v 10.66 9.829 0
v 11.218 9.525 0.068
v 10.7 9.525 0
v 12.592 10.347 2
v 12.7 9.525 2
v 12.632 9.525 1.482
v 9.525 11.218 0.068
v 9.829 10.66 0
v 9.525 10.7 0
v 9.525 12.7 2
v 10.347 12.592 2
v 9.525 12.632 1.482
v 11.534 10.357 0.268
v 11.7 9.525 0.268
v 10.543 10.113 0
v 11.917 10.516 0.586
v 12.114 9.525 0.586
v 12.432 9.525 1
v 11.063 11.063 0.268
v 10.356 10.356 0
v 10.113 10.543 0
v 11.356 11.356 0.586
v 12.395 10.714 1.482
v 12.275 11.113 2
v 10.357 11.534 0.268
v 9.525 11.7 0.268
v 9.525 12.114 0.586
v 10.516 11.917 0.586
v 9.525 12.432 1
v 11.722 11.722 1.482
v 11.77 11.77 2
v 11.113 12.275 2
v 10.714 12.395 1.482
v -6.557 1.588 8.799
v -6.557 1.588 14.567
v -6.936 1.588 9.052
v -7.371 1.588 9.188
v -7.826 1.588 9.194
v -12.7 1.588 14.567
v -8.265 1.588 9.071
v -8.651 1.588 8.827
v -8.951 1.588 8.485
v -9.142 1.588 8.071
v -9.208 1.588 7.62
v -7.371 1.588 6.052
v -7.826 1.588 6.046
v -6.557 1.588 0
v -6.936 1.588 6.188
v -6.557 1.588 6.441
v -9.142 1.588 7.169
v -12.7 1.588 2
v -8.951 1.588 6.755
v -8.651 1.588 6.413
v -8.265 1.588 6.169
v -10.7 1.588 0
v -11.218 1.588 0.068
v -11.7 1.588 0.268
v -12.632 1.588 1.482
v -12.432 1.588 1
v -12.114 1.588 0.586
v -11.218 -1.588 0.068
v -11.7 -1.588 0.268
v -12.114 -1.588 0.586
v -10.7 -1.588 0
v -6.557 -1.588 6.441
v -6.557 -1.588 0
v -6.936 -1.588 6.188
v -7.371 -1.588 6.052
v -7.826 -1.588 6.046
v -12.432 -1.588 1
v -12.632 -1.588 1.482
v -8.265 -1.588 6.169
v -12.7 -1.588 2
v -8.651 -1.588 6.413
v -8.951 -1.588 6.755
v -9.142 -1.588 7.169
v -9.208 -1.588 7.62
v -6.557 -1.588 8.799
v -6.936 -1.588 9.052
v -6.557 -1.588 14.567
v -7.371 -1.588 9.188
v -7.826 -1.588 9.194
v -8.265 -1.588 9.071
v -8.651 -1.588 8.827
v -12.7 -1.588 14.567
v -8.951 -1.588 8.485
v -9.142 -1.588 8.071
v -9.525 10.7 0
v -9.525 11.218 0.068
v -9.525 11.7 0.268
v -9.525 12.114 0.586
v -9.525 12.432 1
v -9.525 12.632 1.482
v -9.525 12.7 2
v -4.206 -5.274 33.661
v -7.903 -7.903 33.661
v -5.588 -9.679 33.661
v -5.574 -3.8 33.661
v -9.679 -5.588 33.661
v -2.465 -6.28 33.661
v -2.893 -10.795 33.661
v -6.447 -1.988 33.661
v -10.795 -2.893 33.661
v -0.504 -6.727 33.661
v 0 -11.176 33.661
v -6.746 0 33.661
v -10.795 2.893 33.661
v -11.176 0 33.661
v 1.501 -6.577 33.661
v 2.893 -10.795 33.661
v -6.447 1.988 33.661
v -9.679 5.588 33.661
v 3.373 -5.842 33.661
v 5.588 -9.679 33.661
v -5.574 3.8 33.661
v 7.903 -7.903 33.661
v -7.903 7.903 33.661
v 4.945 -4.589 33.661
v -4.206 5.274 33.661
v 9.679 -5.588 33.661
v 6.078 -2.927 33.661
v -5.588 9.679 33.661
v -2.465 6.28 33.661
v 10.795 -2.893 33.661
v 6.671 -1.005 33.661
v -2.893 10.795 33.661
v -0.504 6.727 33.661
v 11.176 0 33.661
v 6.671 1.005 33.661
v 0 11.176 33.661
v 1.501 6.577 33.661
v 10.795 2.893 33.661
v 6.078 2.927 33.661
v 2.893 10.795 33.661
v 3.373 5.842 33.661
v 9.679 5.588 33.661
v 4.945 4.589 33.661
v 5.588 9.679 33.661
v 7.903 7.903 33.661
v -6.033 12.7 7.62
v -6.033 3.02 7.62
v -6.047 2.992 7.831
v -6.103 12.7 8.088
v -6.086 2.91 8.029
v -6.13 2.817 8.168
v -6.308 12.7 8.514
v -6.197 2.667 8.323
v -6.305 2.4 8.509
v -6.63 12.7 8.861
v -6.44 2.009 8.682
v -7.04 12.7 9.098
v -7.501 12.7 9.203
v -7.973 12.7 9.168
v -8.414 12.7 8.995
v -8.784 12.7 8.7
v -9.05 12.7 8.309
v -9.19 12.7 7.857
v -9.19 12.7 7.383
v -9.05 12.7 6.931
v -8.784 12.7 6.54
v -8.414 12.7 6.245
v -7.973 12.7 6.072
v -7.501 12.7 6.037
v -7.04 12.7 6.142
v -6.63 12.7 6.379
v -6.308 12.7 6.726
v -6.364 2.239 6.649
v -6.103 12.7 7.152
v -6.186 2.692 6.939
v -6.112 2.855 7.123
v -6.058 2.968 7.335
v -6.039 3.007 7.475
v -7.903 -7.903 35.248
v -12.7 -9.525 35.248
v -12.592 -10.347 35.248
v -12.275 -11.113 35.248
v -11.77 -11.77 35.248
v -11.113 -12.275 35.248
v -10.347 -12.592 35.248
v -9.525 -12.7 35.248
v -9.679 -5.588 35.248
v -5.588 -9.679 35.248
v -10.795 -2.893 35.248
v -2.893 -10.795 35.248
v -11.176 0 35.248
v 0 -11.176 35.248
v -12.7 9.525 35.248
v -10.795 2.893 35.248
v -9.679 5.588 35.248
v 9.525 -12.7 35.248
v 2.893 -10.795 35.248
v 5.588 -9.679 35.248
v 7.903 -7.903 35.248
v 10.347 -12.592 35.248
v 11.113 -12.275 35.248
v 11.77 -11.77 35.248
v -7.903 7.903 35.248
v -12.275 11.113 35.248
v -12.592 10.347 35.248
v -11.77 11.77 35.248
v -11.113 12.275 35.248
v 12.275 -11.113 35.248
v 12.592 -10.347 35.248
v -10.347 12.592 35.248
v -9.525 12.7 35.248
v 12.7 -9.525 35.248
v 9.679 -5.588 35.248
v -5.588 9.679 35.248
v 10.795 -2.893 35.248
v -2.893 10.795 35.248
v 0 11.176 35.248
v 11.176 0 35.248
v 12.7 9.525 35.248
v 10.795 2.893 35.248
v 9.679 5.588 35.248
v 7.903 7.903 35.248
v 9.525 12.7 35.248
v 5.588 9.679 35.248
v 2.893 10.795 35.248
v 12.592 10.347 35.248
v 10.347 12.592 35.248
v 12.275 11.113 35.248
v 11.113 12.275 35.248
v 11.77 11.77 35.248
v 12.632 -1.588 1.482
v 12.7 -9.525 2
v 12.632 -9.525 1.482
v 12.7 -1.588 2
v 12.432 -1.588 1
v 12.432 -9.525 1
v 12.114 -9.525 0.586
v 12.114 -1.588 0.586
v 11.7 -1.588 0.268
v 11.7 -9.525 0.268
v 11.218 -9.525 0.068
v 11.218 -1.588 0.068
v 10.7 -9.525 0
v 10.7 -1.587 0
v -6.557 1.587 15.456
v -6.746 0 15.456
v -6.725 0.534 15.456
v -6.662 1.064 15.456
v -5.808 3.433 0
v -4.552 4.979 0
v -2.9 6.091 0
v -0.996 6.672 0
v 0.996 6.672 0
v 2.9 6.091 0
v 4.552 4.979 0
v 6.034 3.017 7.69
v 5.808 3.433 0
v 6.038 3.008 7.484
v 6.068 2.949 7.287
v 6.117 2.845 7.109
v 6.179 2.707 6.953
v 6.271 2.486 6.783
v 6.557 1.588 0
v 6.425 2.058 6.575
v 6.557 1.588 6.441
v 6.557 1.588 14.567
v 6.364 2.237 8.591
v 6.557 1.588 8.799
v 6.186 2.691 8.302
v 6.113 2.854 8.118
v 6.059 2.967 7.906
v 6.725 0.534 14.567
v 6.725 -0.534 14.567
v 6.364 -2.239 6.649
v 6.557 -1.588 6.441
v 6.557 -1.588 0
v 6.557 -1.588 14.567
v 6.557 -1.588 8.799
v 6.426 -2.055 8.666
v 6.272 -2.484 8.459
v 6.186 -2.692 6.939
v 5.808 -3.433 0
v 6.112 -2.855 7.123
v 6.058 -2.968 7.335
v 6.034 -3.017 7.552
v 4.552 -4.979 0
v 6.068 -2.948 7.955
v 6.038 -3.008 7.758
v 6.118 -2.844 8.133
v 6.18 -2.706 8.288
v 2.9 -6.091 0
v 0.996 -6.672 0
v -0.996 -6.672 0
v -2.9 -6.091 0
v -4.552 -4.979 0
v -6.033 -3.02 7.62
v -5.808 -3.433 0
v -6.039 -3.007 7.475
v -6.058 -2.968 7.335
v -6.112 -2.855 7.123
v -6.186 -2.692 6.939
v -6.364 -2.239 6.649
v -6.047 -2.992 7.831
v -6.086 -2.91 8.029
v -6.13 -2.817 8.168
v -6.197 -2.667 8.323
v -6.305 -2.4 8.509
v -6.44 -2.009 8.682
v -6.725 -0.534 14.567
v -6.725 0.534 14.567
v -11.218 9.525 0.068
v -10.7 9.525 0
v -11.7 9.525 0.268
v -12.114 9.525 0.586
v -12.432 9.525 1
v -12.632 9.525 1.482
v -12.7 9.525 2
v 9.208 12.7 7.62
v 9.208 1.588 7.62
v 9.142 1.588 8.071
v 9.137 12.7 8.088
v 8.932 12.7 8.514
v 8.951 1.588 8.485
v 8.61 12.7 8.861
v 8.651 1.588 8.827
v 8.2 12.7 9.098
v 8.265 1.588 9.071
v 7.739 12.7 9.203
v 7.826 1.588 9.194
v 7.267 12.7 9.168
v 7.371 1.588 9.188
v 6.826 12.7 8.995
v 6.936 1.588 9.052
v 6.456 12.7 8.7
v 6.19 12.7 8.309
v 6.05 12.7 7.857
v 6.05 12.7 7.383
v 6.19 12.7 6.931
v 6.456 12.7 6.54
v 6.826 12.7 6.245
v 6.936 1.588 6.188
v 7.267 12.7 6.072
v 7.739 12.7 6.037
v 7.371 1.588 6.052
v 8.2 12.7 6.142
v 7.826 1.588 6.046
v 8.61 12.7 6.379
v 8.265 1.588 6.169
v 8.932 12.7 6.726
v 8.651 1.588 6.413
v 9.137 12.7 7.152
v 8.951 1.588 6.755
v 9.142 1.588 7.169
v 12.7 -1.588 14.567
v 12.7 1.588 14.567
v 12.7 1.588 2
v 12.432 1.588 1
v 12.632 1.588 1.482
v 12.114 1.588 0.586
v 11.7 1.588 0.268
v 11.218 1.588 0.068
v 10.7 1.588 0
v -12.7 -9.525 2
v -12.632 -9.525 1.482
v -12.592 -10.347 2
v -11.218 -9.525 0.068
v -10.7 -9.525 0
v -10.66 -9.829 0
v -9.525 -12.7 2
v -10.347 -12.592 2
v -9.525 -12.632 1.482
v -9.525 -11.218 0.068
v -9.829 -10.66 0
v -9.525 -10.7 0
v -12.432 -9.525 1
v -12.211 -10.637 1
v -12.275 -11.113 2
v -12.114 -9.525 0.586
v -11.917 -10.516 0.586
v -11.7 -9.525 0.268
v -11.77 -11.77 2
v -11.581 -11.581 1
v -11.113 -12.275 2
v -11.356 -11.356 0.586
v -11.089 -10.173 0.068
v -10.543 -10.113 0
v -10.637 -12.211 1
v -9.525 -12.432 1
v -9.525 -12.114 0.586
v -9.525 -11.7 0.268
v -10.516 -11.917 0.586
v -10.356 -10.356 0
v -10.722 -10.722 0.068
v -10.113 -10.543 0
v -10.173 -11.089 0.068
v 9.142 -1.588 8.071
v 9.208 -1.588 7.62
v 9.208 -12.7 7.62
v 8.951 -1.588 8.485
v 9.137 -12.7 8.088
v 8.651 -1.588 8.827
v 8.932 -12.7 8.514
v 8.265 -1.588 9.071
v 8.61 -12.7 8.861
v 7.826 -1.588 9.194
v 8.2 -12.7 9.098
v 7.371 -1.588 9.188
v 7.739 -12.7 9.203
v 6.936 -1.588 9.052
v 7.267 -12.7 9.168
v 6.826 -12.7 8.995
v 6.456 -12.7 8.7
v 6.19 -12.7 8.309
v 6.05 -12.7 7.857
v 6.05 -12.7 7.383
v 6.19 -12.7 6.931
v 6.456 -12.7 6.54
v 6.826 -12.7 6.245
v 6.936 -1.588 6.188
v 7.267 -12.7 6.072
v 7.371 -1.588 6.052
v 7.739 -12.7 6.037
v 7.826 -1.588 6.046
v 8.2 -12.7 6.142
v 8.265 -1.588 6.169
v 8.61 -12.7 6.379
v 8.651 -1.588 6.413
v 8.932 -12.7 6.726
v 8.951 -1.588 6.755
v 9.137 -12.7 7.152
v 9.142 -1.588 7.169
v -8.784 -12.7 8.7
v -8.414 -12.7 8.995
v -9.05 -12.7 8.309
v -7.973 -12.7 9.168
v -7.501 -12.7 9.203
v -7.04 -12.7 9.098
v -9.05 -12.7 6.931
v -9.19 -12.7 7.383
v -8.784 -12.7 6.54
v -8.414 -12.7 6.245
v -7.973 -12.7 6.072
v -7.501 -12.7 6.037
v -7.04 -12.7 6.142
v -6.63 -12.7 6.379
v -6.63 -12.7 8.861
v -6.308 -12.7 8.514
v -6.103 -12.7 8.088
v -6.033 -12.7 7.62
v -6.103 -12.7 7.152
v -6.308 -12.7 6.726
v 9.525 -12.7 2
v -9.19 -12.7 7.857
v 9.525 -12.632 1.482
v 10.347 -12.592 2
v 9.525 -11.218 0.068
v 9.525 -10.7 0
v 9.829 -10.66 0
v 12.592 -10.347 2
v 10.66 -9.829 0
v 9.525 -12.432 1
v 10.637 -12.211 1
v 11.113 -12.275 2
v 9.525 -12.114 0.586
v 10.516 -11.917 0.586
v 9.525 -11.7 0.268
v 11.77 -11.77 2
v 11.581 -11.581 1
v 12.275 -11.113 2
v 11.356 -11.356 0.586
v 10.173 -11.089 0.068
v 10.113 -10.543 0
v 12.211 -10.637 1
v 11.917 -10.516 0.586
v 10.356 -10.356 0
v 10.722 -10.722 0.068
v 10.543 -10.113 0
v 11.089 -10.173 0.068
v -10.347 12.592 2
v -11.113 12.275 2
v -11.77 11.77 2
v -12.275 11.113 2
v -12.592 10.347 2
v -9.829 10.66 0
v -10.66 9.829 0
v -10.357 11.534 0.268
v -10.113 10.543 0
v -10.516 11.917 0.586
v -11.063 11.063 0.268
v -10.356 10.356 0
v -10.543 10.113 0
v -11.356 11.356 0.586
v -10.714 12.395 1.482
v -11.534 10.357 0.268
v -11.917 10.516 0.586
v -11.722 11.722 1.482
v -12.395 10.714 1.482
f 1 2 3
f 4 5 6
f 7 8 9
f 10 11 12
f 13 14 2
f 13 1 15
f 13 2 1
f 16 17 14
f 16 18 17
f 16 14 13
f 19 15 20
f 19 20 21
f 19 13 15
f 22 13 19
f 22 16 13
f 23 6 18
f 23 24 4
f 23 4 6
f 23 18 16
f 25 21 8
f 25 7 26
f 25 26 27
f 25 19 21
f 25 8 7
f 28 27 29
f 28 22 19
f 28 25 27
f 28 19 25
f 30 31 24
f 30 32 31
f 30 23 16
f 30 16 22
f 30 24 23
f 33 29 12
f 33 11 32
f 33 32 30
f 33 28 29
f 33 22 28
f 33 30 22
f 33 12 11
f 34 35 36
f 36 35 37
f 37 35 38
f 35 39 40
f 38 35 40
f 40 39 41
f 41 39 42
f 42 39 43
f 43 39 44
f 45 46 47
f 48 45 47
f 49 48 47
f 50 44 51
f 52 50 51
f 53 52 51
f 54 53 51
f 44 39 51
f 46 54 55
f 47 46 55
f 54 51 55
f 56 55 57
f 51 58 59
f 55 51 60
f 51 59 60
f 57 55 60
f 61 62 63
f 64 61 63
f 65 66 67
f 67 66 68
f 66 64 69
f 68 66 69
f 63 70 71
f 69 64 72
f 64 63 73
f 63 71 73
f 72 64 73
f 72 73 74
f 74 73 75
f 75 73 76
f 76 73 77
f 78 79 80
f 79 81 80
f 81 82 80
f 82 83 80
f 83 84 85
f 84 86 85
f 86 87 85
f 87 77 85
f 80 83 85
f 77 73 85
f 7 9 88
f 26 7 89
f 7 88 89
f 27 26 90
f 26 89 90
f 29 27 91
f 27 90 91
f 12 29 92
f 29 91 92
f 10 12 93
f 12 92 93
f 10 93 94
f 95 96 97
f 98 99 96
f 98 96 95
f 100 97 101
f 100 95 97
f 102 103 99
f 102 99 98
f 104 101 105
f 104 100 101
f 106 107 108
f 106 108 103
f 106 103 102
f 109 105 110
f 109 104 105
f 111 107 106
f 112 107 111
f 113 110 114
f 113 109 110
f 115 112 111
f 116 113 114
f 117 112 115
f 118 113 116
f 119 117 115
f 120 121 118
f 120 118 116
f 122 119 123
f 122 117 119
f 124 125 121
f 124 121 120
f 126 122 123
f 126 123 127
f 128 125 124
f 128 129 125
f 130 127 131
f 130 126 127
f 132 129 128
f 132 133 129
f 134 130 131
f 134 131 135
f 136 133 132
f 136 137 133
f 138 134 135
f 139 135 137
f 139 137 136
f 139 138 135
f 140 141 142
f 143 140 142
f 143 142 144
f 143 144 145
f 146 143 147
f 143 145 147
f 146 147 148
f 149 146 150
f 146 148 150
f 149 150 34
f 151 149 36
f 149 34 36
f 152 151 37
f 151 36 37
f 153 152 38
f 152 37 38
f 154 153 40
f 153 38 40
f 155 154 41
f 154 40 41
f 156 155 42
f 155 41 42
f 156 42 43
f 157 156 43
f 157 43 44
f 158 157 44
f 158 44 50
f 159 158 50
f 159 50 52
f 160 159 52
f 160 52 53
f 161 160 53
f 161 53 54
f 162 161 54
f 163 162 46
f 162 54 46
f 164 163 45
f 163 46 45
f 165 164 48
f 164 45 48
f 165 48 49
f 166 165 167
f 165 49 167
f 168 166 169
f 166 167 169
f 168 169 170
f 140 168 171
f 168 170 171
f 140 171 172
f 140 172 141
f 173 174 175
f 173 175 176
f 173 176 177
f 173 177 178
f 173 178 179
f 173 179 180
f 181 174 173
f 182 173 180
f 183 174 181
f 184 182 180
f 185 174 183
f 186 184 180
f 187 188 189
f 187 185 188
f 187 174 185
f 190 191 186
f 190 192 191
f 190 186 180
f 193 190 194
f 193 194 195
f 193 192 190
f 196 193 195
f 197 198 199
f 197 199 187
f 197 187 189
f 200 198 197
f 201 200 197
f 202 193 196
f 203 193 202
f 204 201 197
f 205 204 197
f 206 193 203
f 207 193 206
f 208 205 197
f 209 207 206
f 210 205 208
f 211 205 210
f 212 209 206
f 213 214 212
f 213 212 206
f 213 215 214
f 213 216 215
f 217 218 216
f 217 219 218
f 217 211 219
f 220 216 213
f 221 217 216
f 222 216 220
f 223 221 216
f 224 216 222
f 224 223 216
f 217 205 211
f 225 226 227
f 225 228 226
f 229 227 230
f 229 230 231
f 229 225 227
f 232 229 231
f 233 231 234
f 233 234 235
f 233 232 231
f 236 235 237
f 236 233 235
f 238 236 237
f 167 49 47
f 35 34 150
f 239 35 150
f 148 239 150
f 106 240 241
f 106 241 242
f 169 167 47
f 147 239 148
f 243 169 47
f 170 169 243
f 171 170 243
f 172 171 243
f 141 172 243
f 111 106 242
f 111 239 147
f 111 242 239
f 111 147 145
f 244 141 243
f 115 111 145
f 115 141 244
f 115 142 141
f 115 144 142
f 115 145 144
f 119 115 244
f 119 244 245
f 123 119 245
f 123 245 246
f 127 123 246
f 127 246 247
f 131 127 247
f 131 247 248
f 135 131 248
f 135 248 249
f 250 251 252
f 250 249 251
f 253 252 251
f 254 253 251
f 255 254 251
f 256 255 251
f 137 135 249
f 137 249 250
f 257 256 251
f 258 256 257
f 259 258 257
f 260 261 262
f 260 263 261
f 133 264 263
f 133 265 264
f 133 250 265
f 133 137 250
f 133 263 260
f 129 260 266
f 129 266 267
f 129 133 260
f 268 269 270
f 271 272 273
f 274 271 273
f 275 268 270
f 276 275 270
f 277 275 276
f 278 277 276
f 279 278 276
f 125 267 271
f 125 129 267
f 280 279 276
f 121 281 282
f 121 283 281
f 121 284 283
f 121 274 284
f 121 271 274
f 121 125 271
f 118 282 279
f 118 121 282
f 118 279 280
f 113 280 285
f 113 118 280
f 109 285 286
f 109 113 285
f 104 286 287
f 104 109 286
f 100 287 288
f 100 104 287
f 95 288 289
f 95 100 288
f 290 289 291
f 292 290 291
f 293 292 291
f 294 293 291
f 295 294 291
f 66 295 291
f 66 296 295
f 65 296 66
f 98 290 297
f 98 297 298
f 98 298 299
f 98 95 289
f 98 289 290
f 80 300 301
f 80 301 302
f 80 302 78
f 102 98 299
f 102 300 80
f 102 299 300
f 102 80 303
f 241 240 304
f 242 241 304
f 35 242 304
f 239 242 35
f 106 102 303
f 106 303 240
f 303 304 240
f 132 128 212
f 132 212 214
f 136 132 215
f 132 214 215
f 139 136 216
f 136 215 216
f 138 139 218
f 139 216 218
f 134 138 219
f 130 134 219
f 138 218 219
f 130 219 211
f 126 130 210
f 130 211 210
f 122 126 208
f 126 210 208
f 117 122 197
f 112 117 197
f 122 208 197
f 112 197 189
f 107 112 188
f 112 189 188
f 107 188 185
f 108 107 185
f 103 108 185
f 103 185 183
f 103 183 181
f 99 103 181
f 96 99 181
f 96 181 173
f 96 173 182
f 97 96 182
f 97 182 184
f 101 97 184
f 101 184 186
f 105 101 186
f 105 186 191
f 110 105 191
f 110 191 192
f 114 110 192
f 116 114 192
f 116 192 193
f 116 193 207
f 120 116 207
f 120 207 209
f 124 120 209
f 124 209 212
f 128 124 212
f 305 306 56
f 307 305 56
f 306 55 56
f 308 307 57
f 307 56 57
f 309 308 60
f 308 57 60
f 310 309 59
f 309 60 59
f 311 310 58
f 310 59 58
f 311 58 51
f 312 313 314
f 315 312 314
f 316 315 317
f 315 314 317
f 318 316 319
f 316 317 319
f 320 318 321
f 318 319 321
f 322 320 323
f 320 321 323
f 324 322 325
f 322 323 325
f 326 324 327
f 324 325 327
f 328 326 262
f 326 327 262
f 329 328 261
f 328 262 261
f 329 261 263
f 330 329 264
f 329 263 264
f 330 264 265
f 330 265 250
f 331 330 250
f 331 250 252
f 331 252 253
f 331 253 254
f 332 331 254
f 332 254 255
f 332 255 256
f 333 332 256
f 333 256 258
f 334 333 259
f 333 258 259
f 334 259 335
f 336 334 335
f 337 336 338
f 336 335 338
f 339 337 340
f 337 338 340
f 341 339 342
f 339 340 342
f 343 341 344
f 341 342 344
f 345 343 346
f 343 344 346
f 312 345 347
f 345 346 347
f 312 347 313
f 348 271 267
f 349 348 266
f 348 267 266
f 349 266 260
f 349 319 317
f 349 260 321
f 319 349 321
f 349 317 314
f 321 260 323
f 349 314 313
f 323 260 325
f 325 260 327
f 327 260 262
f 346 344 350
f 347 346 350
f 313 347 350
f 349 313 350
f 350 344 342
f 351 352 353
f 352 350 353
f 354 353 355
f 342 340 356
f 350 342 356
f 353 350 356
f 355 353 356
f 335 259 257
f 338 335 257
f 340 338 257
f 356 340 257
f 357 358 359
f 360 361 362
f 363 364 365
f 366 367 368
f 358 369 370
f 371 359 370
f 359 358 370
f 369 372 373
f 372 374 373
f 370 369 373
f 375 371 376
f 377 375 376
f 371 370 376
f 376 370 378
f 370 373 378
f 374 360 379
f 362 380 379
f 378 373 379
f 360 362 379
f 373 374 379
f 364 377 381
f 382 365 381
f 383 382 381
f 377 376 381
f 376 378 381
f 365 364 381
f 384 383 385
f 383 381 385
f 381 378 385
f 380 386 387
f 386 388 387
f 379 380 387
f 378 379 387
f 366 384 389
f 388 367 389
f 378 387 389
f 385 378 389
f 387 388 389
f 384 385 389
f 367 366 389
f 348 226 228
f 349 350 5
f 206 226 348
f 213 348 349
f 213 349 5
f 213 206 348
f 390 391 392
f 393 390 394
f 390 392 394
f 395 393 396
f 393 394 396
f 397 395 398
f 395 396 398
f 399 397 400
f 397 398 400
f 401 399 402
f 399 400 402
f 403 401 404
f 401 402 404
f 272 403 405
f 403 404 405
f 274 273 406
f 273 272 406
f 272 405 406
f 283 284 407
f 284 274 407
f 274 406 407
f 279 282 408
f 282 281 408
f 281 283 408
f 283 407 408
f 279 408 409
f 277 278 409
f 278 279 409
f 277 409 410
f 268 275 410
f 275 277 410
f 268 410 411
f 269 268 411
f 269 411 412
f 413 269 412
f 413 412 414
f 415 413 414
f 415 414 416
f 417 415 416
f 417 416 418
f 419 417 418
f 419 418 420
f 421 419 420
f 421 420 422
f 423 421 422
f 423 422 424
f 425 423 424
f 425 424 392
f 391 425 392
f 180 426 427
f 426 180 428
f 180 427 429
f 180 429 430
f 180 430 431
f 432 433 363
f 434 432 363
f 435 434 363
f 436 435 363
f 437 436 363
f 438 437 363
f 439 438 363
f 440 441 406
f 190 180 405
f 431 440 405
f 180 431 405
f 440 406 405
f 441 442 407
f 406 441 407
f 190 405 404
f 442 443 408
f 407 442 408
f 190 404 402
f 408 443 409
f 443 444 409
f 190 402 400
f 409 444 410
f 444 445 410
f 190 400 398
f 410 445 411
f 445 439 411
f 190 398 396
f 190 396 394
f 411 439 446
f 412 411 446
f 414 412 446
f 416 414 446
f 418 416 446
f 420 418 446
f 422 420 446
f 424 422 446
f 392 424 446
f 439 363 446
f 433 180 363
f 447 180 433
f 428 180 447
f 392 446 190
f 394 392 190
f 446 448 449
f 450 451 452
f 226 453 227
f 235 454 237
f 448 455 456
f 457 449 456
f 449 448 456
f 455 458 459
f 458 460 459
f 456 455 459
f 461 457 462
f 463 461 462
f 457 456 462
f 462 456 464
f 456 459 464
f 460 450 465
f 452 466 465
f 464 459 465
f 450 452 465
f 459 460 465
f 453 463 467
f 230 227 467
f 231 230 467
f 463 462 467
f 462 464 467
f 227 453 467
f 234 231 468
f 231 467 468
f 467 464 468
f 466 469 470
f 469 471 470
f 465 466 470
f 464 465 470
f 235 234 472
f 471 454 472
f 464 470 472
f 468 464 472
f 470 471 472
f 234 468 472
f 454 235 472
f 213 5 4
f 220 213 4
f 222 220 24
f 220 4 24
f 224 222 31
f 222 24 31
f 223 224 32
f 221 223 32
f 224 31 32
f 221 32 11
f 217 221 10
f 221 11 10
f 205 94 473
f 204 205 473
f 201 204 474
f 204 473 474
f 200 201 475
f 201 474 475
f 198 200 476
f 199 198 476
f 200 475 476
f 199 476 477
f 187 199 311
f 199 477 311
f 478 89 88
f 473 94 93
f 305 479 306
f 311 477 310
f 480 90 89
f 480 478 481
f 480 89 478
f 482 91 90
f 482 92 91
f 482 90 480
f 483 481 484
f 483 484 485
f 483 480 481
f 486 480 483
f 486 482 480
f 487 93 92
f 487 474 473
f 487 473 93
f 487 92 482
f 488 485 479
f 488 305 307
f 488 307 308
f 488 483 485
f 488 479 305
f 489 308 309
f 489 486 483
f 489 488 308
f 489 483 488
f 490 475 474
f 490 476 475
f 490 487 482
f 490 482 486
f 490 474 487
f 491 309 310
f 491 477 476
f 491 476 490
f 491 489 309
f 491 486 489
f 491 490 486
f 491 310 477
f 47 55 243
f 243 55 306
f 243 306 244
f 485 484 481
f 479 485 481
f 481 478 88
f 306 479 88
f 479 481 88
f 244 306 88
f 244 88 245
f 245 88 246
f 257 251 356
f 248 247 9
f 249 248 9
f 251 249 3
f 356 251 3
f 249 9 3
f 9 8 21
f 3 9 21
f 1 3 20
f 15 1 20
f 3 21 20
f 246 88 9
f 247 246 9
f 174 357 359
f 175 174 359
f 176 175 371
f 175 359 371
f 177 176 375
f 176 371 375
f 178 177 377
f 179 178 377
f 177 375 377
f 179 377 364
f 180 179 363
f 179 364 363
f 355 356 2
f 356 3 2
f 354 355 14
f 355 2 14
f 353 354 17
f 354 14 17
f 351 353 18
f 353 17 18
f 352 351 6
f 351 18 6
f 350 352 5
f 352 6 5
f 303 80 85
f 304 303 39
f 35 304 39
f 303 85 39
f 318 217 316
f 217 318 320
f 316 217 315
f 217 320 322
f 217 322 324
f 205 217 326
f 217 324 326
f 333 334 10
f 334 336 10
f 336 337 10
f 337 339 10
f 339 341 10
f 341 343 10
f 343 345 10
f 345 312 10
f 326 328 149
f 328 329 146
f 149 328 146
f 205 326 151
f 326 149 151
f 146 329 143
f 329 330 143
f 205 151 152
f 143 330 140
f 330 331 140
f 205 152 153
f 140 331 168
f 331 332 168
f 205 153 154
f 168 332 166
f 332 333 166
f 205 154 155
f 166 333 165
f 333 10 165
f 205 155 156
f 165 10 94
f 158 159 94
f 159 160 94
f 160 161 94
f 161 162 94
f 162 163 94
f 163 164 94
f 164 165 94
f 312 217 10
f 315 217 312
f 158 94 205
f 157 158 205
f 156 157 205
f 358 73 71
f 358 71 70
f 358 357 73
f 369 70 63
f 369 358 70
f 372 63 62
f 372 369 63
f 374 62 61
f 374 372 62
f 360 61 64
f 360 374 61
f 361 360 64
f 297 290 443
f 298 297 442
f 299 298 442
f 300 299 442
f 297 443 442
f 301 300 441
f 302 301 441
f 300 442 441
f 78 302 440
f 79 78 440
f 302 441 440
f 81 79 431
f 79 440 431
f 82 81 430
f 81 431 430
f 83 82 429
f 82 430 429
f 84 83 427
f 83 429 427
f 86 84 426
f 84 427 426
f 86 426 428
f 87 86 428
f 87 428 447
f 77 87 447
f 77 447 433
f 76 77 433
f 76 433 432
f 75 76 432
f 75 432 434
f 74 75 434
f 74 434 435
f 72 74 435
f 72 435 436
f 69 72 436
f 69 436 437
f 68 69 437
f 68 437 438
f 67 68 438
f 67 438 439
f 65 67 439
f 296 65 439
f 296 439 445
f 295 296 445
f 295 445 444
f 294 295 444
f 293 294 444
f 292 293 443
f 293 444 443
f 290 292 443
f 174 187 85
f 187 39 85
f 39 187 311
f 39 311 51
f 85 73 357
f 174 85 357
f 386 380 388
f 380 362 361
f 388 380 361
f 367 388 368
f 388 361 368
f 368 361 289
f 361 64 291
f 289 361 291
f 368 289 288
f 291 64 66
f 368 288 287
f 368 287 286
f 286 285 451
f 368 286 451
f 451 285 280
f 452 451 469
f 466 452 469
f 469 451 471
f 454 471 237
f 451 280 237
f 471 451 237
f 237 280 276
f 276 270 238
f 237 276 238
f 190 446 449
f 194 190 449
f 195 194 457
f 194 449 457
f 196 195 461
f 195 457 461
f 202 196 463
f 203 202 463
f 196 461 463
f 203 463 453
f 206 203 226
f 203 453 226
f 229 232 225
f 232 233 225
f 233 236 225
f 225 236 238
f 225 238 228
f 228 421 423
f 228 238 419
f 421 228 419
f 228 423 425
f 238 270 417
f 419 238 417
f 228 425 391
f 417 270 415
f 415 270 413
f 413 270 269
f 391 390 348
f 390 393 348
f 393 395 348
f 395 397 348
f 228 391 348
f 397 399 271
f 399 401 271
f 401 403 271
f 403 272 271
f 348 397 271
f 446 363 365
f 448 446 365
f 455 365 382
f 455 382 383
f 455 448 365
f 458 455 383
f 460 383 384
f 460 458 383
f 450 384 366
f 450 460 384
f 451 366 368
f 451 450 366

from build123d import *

# Parameters (mm, degrees)
F1_DEPTH  = 36.093
F3_D      = 13.49248
F4_R      = 11.176
F5_DEPTH  = 1.5875
F7_DEPTH  = 25.401
F8_R      = 1.5875
F9_DEPTH  = 25.401
F10_R     = 2
F11_DEPTH = 0.845
F12_DEPTH = 0.845
F13_DEPTH = 0.889


with BuildPart() as f1:
    # F0 (on Top) → F1 (new body)
    with BuildSketch(Plane.XY):
        with BuildLine():
            Line((9.525, 12.7), (-9.525, 12.7))
            ThreePointArc((-9.525, 12.7), (-11.7700640303, 11.7700640303), (-12.7, 9.525))
            Line((-12.7, 9.525), (-12.7, -9.525))
            ThreePointArc((-12.7, -9.525), (-11.7700640303, -11.7700640303), (-9.525, -12.7))
            Line((-9.525, -12.7), (9.525, -12.7))
            ThreePointArc((9.525, -12.7), (11.7700640303, -11.7700640303), (12.7, -9.525))
            Line((12.7, -9.525), (12.7, 9.525))
            ThreePointArc((12.7, 9.525), (11.7700640303, 11.7700640303), (9.525, 12.7))
        make_face()
    extrude(amount=F1_DEPTH)

    # F3 (through all)
    with Locations(Plane.XY.offset(36.093)):
        with Locations((0, 0)):
            Hole(F3_D / 2)

    # F4 (on face) → F5 (cut)
    with BuildSketch(Plane.XY.offset(36.093)):
        Circle(F4_R)
    extrude(amount=-F5_DEPTH, mode=Mode.SUBTRACT)

    # F6 (on face) → F7 (cut, through all)
    with BuildSketch(Plane(origin=(-12.7, 0, 0), x_dir=(0, -1, 0), z_dir=(-1, 0, 0))):
        Polygon((1.5875, 15.4555), (0, 15.4555), (-1.5875, 15.4555), (-1.5875, -0.7945992402), (1.5875, -1.3757834677), align=None)
    extrude(amount=-F7_DEPTH, mode=Mode.SUBTRACT)

    # F8 (on face) → F9 (cut, through all)
    with BuildSketch(Plane.XZ.offset(12.7)):
        with Locations((-7.62, 7.62)):
            Circle(F8_R)
        with Locations((7.62, 7.62)):
            Circle(F8_R)
    extrude(amount=-F9_DEPTH, mode=Mode.SUBTRACT)

    # F10
    f10_edges = [f1.edges().sort_by_distance(p)[0] for p in [
        (-12.7, 5.55625, 0),
        (-12.7, -5.55625, 0),
    ]]
    fillet(f10_edges, radius=F10_R)

    # F11 (cut): a face of the model
    f11_faces = [f1.faces().sort_by_distance(p)[0] for p in [
        (0, 12.3407897552, 36.093),
    ]]
    extrude(f11_faces, amount=-F11_DEPTH, mode=Mode.SUBTRACT)

    # F12 (cut): a face of the model
    f12_faces = [f1.faces().sort_by_distance(p)[0] for p in [
        (-10.8598949845, 0, 34.5055),
    ]]
    extrude(f12_faces, amount=-F12_DEPTH, mode=Mode.SUBTRACT)

    # F13 (add): faces of the model
    f13_faces = [f1.faces().sort_by_distance(p)[0] for p in [
        (9.6914617735, 0, 15.4555),
        (-9.6914617735, 0, 15.4555),
    ]]
    extrude(f13_faces, amount=F13_DEPTH)


solid = f1.part
